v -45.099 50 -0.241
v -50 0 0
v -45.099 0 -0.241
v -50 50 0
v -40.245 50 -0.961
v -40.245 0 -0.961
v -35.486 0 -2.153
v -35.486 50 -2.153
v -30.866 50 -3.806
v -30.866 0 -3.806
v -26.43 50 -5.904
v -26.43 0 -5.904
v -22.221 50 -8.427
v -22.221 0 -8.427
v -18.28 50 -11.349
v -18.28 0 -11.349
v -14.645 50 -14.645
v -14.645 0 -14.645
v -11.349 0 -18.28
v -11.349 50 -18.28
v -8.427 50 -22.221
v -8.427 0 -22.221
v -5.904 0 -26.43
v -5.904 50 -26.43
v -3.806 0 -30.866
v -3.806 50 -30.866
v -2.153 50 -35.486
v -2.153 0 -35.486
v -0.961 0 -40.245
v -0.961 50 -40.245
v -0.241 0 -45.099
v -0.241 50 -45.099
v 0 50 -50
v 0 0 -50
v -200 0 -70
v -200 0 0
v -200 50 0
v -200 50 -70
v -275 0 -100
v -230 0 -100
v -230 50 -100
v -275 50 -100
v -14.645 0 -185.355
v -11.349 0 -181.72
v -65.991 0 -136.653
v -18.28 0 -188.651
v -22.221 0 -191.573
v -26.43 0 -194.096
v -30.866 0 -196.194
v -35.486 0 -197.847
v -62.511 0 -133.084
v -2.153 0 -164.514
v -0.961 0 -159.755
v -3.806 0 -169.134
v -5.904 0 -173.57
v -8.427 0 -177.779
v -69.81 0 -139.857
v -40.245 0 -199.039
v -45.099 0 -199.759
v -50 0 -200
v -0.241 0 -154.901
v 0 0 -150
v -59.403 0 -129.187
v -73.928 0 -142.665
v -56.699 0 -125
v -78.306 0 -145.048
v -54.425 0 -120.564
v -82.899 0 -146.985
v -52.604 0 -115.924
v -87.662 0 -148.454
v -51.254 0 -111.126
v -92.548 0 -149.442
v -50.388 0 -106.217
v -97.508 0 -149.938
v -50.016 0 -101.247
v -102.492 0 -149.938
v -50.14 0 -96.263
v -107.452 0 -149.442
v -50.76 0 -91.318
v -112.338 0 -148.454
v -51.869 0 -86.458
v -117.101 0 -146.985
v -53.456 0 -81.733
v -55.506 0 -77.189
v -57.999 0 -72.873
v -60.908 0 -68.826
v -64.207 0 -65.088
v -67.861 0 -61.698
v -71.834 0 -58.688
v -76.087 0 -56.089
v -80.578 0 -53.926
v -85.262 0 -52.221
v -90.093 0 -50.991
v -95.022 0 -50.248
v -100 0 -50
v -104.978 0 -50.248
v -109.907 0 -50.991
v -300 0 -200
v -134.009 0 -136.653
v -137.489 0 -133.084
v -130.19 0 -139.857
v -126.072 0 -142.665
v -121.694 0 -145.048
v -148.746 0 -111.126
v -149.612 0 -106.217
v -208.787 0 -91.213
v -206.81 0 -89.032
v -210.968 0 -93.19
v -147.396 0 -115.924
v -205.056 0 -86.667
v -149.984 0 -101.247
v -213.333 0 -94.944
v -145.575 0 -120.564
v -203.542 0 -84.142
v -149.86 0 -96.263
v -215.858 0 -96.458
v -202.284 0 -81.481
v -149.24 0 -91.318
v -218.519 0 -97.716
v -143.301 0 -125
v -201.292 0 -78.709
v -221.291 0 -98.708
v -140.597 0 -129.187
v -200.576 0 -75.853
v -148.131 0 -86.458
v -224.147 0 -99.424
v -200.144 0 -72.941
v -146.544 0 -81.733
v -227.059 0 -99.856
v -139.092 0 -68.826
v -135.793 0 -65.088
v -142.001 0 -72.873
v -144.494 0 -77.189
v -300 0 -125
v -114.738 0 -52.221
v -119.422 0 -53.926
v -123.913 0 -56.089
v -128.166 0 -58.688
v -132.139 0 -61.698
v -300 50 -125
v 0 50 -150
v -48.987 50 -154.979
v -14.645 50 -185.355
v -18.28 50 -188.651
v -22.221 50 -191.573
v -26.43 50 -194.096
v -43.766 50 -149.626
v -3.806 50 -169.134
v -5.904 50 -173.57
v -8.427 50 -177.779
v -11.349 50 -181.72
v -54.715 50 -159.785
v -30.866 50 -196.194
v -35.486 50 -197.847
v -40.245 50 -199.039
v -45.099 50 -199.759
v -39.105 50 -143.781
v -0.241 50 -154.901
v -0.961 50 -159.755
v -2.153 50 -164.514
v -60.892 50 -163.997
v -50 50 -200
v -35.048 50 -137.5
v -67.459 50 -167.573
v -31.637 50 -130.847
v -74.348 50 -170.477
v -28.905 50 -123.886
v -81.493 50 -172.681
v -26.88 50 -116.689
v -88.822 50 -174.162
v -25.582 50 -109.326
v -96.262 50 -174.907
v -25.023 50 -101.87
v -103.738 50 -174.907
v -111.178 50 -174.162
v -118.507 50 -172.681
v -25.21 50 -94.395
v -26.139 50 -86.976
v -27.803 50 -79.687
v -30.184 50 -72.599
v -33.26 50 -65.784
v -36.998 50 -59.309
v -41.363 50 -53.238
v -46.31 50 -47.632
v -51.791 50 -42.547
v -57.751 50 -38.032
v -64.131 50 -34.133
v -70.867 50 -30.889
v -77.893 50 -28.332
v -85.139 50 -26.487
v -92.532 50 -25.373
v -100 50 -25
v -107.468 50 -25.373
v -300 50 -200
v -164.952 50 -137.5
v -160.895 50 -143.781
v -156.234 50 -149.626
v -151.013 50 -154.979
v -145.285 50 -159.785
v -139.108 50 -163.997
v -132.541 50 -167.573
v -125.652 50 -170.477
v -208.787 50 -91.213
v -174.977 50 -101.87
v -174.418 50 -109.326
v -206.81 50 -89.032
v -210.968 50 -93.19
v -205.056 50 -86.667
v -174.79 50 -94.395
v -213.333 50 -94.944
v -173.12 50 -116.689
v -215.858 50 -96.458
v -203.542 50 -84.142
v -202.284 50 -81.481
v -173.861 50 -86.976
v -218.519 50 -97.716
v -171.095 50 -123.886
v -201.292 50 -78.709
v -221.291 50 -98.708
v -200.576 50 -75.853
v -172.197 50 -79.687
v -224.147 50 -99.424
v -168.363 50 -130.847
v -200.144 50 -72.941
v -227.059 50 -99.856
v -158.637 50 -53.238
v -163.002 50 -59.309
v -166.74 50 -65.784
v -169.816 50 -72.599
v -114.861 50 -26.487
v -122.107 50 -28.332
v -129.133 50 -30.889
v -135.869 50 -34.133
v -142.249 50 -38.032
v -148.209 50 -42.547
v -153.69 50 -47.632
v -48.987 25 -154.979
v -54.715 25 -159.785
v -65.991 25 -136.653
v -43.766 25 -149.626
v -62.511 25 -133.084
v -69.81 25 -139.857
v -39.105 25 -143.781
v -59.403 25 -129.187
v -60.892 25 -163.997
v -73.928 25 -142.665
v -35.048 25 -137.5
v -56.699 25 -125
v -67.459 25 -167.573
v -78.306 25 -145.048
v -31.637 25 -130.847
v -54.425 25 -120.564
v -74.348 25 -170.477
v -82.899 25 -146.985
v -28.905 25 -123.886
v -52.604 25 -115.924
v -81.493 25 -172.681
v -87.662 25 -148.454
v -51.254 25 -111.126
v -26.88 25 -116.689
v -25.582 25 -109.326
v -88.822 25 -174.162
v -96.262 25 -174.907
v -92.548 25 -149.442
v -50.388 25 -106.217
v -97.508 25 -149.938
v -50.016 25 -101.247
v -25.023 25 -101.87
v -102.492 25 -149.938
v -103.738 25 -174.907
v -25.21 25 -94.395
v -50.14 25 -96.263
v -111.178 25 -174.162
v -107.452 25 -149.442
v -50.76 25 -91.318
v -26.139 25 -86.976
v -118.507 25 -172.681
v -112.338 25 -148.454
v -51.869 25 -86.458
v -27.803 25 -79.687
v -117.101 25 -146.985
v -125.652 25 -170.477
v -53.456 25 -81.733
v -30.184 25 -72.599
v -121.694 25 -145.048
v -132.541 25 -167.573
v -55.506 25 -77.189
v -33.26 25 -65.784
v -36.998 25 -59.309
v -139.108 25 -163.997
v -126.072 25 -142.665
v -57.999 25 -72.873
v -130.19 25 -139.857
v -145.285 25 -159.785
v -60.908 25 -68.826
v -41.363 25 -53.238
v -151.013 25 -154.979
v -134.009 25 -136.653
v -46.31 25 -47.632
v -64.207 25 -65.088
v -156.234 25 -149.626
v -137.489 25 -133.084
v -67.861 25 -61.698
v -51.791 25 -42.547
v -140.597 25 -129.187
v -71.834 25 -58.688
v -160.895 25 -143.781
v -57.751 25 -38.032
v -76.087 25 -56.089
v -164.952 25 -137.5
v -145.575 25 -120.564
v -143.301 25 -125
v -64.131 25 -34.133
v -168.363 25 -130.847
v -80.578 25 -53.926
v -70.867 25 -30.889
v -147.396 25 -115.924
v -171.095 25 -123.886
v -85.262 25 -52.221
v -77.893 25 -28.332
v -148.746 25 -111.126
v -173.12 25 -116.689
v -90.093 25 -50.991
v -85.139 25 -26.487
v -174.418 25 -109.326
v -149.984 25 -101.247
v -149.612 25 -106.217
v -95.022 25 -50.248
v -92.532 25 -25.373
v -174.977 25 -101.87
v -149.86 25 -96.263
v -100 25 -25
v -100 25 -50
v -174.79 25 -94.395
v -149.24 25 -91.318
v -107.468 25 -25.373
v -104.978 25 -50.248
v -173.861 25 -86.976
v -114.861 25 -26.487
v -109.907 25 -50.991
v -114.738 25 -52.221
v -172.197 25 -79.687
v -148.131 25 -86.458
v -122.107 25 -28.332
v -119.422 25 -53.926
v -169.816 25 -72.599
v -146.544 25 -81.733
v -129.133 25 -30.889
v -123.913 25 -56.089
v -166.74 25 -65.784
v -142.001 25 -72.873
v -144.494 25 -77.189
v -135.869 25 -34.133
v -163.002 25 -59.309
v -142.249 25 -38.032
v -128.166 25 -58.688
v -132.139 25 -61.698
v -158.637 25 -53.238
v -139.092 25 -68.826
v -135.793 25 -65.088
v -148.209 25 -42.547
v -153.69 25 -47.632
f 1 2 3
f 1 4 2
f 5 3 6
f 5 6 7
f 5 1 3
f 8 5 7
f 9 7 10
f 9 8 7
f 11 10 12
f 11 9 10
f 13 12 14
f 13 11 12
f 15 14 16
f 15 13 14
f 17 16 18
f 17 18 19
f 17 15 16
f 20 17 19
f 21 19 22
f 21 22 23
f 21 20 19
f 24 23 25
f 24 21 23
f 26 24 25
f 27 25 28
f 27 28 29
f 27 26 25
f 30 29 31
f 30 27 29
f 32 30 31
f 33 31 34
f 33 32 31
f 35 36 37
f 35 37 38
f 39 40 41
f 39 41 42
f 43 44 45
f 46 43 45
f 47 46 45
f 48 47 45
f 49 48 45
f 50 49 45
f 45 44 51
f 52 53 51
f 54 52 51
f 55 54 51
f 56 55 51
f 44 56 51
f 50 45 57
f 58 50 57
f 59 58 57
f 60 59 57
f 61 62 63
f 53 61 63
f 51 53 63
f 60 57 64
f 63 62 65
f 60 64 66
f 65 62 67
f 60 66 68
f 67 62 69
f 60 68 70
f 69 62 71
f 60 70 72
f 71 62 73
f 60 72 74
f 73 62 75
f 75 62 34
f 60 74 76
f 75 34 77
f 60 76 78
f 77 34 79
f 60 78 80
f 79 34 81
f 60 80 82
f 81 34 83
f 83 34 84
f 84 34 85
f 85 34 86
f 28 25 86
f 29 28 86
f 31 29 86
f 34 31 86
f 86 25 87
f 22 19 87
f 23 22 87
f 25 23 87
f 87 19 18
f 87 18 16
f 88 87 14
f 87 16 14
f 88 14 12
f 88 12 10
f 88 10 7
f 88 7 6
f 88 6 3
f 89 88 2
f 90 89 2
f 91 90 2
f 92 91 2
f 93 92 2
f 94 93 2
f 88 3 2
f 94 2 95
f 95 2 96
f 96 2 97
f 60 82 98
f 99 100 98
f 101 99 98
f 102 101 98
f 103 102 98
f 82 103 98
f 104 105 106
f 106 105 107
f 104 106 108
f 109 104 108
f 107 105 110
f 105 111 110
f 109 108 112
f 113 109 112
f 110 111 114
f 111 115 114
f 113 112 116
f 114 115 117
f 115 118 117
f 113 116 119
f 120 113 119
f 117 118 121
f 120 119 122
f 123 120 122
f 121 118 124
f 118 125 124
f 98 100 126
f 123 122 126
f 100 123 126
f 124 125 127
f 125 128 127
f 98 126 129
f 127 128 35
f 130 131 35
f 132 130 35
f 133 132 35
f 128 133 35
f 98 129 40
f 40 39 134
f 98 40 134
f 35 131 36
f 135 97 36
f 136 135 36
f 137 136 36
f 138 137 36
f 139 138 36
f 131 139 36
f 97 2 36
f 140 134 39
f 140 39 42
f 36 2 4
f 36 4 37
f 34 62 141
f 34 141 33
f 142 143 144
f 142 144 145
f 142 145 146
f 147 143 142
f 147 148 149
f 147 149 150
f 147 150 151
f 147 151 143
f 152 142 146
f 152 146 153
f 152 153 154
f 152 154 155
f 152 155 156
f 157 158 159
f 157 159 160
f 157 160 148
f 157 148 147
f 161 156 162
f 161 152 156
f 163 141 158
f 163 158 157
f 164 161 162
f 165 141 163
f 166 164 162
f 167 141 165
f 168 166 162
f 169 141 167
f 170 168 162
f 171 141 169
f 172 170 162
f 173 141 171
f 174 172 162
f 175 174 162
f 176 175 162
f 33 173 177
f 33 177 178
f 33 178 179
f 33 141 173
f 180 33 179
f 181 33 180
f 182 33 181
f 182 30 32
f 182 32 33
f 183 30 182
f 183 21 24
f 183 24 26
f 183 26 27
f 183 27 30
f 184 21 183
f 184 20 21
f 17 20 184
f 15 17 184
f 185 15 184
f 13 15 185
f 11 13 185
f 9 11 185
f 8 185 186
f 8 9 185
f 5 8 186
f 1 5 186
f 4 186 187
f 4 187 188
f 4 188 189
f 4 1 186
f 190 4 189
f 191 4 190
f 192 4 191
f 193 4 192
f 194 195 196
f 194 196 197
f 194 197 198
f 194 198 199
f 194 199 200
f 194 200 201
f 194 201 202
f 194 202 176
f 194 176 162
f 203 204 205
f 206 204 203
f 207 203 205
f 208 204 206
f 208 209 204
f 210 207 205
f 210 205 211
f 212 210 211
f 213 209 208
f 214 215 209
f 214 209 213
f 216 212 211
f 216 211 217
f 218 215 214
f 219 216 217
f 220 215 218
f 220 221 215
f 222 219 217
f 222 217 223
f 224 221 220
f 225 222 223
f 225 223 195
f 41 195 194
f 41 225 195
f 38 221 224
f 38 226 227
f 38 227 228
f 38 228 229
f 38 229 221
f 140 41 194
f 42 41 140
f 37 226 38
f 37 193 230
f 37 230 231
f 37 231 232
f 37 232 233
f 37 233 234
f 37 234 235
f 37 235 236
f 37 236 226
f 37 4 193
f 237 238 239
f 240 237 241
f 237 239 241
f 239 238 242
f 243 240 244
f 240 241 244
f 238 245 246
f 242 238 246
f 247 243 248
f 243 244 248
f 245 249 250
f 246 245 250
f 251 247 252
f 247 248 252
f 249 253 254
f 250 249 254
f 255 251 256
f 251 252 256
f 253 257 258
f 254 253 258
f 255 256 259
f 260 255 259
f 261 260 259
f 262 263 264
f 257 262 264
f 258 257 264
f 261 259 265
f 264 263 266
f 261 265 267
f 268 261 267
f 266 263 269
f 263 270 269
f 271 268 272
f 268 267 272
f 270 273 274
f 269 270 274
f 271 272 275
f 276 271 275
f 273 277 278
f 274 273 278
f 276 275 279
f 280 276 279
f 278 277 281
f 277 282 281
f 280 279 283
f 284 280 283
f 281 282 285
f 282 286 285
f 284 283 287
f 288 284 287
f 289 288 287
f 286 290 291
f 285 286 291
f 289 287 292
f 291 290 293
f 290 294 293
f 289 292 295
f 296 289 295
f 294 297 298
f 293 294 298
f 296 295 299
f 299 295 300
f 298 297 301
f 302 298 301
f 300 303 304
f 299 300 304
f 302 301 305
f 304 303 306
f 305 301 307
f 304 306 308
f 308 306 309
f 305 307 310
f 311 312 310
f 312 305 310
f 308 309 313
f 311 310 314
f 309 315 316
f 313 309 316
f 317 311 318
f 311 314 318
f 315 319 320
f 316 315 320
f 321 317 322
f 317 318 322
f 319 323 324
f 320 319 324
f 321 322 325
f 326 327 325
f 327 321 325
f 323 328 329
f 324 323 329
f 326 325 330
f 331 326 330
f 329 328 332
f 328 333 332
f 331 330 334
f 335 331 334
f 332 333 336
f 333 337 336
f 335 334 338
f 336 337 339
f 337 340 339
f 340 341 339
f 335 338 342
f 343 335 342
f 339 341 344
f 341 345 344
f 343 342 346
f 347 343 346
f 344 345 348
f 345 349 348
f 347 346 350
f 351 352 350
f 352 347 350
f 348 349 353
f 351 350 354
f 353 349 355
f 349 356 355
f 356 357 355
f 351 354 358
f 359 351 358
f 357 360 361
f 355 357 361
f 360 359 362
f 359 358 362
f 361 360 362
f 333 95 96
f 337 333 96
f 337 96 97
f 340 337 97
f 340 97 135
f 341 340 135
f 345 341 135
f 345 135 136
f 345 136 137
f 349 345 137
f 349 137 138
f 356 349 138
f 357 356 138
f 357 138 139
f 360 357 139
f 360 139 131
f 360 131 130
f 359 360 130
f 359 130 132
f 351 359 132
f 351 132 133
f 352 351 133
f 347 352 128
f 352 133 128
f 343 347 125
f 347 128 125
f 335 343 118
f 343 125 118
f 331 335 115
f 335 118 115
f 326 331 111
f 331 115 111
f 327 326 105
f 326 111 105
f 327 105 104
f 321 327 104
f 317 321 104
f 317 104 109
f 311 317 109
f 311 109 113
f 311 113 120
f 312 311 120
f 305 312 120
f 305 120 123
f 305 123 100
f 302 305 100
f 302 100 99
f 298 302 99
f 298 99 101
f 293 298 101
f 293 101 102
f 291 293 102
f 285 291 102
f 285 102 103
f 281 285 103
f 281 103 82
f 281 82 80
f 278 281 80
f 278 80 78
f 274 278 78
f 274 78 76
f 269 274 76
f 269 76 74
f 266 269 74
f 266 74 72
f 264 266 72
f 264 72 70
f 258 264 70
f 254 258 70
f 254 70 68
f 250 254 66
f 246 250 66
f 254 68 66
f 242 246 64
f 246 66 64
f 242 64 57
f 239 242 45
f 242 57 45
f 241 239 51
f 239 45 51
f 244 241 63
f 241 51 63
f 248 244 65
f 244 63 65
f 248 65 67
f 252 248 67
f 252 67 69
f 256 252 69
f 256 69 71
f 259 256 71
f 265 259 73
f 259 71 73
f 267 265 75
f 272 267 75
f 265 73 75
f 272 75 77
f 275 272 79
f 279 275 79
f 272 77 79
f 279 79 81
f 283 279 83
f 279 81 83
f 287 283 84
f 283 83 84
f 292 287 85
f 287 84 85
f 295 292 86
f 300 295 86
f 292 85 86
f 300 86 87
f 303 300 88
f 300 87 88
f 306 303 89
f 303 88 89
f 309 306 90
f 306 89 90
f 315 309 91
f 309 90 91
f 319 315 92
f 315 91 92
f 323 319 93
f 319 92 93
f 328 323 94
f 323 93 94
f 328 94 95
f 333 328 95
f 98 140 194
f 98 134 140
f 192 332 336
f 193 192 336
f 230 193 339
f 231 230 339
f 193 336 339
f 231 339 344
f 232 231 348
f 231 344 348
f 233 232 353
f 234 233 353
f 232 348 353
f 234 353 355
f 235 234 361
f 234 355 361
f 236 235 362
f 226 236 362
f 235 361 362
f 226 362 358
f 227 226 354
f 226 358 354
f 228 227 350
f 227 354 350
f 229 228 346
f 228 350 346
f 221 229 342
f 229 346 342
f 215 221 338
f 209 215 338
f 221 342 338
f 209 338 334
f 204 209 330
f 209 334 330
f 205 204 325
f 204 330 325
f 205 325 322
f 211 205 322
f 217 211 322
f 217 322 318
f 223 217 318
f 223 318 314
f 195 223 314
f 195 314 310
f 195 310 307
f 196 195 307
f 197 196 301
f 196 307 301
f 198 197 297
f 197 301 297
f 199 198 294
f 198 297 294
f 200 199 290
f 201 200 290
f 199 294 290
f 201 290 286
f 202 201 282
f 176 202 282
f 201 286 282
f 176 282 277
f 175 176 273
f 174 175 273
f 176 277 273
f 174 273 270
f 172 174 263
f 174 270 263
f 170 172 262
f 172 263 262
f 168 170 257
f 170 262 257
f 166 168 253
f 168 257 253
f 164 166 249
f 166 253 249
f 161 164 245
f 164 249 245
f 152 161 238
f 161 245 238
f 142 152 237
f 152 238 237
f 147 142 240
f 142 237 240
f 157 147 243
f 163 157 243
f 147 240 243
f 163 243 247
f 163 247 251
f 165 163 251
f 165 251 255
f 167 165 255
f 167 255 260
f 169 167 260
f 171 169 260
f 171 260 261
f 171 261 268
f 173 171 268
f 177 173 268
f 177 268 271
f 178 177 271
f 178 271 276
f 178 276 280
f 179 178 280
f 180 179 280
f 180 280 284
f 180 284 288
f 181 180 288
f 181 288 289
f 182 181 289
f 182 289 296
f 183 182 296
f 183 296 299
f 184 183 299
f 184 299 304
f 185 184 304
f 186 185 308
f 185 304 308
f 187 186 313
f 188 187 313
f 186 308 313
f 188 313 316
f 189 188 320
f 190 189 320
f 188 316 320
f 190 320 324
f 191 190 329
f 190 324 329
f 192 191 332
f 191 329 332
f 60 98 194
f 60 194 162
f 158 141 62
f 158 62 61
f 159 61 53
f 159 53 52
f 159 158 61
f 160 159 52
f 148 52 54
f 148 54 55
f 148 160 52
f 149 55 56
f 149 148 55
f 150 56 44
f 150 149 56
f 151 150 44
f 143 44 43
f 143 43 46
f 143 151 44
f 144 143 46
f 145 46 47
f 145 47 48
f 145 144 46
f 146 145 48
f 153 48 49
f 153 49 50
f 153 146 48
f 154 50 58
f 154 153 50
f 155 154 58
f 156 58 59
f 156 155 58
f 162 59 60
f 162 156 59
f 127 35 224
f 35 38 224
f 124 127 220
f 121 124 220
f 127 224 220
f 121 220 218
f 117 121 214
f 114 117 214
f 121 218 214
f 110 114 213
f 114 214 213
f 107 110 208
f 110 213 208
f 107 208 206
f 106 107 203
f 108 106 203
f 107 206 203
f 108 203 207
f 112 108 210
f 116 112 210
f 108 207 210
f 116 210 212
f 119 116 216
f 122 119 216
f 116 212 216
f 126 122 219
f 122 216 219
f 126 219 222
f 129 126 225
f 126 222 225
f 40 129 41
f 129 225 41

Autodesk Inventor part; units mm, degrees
ref_plane "YZ Plane" through (0, 0, 0) normal (1, 0, 0) x (0, 1, 0)
ref_plane "XZ Plane" through (0, 0, 0) normal (0, 1, 0) x (-1, 0, 0)
ref_plane "XY Plane" through (0, 0, 0) normal (0, 0, 1) x (1, 0, 0)
sketch "Esboço1" plane through (0, 0, 0) normal (0, 1, 0) x (-1, 0, 0)
  line L0 (0, 0) -> (200, 0)
  line L1 (200, 0) -> (200, -100)
  line L2 (200, -100) -> (300, -100)
  line L3 (300, -100) -> (300, -200)
  line L4 (300, -200) -> (0, -200)
  line L5 (0, -200) -> (0, 0)
  dimension "d0" = 200
  dimension "d1" = 300
  dimension "d3" = 200
  dimension "d4" = 100
extrude "Extrusão1" add sketch "Esboço1" along normal blind 50
sketch "Esboço2" plane through (0, 50, 0) normal (0, 1, 0) x (1, 0, 0)
  line L0 (0, 0) -> (0, 200) projected
  line L1 (0, 200) -> (-300, 200) projected
  point P0 (-100, 100)
  dimension "d7" = 100
  dimension "d15" = 100
hole "Furo1" at (-100, 50, -100) direction (0, -1, 0) diameter 100 end through all counterbore diameter 150 counterbore depth 25
fillet "Arredondamento1" radius 50 2 edges at (0, 25, 0) (0, 25, -200)
fillet "Arredondamento2" radius 30 1 edges at (-200, 25, -100)
chamfer "Chanfro1" distance 25 angle 45 1 edges at (-300, 25, -100) measured on face at (-276.6667, 16.6667, -100)
equation "\"d7\" = 0.5 * d3"
equation "\"d15\" = 0.5 * d0"
equation "\"d16\" = 0.25 * d3"
